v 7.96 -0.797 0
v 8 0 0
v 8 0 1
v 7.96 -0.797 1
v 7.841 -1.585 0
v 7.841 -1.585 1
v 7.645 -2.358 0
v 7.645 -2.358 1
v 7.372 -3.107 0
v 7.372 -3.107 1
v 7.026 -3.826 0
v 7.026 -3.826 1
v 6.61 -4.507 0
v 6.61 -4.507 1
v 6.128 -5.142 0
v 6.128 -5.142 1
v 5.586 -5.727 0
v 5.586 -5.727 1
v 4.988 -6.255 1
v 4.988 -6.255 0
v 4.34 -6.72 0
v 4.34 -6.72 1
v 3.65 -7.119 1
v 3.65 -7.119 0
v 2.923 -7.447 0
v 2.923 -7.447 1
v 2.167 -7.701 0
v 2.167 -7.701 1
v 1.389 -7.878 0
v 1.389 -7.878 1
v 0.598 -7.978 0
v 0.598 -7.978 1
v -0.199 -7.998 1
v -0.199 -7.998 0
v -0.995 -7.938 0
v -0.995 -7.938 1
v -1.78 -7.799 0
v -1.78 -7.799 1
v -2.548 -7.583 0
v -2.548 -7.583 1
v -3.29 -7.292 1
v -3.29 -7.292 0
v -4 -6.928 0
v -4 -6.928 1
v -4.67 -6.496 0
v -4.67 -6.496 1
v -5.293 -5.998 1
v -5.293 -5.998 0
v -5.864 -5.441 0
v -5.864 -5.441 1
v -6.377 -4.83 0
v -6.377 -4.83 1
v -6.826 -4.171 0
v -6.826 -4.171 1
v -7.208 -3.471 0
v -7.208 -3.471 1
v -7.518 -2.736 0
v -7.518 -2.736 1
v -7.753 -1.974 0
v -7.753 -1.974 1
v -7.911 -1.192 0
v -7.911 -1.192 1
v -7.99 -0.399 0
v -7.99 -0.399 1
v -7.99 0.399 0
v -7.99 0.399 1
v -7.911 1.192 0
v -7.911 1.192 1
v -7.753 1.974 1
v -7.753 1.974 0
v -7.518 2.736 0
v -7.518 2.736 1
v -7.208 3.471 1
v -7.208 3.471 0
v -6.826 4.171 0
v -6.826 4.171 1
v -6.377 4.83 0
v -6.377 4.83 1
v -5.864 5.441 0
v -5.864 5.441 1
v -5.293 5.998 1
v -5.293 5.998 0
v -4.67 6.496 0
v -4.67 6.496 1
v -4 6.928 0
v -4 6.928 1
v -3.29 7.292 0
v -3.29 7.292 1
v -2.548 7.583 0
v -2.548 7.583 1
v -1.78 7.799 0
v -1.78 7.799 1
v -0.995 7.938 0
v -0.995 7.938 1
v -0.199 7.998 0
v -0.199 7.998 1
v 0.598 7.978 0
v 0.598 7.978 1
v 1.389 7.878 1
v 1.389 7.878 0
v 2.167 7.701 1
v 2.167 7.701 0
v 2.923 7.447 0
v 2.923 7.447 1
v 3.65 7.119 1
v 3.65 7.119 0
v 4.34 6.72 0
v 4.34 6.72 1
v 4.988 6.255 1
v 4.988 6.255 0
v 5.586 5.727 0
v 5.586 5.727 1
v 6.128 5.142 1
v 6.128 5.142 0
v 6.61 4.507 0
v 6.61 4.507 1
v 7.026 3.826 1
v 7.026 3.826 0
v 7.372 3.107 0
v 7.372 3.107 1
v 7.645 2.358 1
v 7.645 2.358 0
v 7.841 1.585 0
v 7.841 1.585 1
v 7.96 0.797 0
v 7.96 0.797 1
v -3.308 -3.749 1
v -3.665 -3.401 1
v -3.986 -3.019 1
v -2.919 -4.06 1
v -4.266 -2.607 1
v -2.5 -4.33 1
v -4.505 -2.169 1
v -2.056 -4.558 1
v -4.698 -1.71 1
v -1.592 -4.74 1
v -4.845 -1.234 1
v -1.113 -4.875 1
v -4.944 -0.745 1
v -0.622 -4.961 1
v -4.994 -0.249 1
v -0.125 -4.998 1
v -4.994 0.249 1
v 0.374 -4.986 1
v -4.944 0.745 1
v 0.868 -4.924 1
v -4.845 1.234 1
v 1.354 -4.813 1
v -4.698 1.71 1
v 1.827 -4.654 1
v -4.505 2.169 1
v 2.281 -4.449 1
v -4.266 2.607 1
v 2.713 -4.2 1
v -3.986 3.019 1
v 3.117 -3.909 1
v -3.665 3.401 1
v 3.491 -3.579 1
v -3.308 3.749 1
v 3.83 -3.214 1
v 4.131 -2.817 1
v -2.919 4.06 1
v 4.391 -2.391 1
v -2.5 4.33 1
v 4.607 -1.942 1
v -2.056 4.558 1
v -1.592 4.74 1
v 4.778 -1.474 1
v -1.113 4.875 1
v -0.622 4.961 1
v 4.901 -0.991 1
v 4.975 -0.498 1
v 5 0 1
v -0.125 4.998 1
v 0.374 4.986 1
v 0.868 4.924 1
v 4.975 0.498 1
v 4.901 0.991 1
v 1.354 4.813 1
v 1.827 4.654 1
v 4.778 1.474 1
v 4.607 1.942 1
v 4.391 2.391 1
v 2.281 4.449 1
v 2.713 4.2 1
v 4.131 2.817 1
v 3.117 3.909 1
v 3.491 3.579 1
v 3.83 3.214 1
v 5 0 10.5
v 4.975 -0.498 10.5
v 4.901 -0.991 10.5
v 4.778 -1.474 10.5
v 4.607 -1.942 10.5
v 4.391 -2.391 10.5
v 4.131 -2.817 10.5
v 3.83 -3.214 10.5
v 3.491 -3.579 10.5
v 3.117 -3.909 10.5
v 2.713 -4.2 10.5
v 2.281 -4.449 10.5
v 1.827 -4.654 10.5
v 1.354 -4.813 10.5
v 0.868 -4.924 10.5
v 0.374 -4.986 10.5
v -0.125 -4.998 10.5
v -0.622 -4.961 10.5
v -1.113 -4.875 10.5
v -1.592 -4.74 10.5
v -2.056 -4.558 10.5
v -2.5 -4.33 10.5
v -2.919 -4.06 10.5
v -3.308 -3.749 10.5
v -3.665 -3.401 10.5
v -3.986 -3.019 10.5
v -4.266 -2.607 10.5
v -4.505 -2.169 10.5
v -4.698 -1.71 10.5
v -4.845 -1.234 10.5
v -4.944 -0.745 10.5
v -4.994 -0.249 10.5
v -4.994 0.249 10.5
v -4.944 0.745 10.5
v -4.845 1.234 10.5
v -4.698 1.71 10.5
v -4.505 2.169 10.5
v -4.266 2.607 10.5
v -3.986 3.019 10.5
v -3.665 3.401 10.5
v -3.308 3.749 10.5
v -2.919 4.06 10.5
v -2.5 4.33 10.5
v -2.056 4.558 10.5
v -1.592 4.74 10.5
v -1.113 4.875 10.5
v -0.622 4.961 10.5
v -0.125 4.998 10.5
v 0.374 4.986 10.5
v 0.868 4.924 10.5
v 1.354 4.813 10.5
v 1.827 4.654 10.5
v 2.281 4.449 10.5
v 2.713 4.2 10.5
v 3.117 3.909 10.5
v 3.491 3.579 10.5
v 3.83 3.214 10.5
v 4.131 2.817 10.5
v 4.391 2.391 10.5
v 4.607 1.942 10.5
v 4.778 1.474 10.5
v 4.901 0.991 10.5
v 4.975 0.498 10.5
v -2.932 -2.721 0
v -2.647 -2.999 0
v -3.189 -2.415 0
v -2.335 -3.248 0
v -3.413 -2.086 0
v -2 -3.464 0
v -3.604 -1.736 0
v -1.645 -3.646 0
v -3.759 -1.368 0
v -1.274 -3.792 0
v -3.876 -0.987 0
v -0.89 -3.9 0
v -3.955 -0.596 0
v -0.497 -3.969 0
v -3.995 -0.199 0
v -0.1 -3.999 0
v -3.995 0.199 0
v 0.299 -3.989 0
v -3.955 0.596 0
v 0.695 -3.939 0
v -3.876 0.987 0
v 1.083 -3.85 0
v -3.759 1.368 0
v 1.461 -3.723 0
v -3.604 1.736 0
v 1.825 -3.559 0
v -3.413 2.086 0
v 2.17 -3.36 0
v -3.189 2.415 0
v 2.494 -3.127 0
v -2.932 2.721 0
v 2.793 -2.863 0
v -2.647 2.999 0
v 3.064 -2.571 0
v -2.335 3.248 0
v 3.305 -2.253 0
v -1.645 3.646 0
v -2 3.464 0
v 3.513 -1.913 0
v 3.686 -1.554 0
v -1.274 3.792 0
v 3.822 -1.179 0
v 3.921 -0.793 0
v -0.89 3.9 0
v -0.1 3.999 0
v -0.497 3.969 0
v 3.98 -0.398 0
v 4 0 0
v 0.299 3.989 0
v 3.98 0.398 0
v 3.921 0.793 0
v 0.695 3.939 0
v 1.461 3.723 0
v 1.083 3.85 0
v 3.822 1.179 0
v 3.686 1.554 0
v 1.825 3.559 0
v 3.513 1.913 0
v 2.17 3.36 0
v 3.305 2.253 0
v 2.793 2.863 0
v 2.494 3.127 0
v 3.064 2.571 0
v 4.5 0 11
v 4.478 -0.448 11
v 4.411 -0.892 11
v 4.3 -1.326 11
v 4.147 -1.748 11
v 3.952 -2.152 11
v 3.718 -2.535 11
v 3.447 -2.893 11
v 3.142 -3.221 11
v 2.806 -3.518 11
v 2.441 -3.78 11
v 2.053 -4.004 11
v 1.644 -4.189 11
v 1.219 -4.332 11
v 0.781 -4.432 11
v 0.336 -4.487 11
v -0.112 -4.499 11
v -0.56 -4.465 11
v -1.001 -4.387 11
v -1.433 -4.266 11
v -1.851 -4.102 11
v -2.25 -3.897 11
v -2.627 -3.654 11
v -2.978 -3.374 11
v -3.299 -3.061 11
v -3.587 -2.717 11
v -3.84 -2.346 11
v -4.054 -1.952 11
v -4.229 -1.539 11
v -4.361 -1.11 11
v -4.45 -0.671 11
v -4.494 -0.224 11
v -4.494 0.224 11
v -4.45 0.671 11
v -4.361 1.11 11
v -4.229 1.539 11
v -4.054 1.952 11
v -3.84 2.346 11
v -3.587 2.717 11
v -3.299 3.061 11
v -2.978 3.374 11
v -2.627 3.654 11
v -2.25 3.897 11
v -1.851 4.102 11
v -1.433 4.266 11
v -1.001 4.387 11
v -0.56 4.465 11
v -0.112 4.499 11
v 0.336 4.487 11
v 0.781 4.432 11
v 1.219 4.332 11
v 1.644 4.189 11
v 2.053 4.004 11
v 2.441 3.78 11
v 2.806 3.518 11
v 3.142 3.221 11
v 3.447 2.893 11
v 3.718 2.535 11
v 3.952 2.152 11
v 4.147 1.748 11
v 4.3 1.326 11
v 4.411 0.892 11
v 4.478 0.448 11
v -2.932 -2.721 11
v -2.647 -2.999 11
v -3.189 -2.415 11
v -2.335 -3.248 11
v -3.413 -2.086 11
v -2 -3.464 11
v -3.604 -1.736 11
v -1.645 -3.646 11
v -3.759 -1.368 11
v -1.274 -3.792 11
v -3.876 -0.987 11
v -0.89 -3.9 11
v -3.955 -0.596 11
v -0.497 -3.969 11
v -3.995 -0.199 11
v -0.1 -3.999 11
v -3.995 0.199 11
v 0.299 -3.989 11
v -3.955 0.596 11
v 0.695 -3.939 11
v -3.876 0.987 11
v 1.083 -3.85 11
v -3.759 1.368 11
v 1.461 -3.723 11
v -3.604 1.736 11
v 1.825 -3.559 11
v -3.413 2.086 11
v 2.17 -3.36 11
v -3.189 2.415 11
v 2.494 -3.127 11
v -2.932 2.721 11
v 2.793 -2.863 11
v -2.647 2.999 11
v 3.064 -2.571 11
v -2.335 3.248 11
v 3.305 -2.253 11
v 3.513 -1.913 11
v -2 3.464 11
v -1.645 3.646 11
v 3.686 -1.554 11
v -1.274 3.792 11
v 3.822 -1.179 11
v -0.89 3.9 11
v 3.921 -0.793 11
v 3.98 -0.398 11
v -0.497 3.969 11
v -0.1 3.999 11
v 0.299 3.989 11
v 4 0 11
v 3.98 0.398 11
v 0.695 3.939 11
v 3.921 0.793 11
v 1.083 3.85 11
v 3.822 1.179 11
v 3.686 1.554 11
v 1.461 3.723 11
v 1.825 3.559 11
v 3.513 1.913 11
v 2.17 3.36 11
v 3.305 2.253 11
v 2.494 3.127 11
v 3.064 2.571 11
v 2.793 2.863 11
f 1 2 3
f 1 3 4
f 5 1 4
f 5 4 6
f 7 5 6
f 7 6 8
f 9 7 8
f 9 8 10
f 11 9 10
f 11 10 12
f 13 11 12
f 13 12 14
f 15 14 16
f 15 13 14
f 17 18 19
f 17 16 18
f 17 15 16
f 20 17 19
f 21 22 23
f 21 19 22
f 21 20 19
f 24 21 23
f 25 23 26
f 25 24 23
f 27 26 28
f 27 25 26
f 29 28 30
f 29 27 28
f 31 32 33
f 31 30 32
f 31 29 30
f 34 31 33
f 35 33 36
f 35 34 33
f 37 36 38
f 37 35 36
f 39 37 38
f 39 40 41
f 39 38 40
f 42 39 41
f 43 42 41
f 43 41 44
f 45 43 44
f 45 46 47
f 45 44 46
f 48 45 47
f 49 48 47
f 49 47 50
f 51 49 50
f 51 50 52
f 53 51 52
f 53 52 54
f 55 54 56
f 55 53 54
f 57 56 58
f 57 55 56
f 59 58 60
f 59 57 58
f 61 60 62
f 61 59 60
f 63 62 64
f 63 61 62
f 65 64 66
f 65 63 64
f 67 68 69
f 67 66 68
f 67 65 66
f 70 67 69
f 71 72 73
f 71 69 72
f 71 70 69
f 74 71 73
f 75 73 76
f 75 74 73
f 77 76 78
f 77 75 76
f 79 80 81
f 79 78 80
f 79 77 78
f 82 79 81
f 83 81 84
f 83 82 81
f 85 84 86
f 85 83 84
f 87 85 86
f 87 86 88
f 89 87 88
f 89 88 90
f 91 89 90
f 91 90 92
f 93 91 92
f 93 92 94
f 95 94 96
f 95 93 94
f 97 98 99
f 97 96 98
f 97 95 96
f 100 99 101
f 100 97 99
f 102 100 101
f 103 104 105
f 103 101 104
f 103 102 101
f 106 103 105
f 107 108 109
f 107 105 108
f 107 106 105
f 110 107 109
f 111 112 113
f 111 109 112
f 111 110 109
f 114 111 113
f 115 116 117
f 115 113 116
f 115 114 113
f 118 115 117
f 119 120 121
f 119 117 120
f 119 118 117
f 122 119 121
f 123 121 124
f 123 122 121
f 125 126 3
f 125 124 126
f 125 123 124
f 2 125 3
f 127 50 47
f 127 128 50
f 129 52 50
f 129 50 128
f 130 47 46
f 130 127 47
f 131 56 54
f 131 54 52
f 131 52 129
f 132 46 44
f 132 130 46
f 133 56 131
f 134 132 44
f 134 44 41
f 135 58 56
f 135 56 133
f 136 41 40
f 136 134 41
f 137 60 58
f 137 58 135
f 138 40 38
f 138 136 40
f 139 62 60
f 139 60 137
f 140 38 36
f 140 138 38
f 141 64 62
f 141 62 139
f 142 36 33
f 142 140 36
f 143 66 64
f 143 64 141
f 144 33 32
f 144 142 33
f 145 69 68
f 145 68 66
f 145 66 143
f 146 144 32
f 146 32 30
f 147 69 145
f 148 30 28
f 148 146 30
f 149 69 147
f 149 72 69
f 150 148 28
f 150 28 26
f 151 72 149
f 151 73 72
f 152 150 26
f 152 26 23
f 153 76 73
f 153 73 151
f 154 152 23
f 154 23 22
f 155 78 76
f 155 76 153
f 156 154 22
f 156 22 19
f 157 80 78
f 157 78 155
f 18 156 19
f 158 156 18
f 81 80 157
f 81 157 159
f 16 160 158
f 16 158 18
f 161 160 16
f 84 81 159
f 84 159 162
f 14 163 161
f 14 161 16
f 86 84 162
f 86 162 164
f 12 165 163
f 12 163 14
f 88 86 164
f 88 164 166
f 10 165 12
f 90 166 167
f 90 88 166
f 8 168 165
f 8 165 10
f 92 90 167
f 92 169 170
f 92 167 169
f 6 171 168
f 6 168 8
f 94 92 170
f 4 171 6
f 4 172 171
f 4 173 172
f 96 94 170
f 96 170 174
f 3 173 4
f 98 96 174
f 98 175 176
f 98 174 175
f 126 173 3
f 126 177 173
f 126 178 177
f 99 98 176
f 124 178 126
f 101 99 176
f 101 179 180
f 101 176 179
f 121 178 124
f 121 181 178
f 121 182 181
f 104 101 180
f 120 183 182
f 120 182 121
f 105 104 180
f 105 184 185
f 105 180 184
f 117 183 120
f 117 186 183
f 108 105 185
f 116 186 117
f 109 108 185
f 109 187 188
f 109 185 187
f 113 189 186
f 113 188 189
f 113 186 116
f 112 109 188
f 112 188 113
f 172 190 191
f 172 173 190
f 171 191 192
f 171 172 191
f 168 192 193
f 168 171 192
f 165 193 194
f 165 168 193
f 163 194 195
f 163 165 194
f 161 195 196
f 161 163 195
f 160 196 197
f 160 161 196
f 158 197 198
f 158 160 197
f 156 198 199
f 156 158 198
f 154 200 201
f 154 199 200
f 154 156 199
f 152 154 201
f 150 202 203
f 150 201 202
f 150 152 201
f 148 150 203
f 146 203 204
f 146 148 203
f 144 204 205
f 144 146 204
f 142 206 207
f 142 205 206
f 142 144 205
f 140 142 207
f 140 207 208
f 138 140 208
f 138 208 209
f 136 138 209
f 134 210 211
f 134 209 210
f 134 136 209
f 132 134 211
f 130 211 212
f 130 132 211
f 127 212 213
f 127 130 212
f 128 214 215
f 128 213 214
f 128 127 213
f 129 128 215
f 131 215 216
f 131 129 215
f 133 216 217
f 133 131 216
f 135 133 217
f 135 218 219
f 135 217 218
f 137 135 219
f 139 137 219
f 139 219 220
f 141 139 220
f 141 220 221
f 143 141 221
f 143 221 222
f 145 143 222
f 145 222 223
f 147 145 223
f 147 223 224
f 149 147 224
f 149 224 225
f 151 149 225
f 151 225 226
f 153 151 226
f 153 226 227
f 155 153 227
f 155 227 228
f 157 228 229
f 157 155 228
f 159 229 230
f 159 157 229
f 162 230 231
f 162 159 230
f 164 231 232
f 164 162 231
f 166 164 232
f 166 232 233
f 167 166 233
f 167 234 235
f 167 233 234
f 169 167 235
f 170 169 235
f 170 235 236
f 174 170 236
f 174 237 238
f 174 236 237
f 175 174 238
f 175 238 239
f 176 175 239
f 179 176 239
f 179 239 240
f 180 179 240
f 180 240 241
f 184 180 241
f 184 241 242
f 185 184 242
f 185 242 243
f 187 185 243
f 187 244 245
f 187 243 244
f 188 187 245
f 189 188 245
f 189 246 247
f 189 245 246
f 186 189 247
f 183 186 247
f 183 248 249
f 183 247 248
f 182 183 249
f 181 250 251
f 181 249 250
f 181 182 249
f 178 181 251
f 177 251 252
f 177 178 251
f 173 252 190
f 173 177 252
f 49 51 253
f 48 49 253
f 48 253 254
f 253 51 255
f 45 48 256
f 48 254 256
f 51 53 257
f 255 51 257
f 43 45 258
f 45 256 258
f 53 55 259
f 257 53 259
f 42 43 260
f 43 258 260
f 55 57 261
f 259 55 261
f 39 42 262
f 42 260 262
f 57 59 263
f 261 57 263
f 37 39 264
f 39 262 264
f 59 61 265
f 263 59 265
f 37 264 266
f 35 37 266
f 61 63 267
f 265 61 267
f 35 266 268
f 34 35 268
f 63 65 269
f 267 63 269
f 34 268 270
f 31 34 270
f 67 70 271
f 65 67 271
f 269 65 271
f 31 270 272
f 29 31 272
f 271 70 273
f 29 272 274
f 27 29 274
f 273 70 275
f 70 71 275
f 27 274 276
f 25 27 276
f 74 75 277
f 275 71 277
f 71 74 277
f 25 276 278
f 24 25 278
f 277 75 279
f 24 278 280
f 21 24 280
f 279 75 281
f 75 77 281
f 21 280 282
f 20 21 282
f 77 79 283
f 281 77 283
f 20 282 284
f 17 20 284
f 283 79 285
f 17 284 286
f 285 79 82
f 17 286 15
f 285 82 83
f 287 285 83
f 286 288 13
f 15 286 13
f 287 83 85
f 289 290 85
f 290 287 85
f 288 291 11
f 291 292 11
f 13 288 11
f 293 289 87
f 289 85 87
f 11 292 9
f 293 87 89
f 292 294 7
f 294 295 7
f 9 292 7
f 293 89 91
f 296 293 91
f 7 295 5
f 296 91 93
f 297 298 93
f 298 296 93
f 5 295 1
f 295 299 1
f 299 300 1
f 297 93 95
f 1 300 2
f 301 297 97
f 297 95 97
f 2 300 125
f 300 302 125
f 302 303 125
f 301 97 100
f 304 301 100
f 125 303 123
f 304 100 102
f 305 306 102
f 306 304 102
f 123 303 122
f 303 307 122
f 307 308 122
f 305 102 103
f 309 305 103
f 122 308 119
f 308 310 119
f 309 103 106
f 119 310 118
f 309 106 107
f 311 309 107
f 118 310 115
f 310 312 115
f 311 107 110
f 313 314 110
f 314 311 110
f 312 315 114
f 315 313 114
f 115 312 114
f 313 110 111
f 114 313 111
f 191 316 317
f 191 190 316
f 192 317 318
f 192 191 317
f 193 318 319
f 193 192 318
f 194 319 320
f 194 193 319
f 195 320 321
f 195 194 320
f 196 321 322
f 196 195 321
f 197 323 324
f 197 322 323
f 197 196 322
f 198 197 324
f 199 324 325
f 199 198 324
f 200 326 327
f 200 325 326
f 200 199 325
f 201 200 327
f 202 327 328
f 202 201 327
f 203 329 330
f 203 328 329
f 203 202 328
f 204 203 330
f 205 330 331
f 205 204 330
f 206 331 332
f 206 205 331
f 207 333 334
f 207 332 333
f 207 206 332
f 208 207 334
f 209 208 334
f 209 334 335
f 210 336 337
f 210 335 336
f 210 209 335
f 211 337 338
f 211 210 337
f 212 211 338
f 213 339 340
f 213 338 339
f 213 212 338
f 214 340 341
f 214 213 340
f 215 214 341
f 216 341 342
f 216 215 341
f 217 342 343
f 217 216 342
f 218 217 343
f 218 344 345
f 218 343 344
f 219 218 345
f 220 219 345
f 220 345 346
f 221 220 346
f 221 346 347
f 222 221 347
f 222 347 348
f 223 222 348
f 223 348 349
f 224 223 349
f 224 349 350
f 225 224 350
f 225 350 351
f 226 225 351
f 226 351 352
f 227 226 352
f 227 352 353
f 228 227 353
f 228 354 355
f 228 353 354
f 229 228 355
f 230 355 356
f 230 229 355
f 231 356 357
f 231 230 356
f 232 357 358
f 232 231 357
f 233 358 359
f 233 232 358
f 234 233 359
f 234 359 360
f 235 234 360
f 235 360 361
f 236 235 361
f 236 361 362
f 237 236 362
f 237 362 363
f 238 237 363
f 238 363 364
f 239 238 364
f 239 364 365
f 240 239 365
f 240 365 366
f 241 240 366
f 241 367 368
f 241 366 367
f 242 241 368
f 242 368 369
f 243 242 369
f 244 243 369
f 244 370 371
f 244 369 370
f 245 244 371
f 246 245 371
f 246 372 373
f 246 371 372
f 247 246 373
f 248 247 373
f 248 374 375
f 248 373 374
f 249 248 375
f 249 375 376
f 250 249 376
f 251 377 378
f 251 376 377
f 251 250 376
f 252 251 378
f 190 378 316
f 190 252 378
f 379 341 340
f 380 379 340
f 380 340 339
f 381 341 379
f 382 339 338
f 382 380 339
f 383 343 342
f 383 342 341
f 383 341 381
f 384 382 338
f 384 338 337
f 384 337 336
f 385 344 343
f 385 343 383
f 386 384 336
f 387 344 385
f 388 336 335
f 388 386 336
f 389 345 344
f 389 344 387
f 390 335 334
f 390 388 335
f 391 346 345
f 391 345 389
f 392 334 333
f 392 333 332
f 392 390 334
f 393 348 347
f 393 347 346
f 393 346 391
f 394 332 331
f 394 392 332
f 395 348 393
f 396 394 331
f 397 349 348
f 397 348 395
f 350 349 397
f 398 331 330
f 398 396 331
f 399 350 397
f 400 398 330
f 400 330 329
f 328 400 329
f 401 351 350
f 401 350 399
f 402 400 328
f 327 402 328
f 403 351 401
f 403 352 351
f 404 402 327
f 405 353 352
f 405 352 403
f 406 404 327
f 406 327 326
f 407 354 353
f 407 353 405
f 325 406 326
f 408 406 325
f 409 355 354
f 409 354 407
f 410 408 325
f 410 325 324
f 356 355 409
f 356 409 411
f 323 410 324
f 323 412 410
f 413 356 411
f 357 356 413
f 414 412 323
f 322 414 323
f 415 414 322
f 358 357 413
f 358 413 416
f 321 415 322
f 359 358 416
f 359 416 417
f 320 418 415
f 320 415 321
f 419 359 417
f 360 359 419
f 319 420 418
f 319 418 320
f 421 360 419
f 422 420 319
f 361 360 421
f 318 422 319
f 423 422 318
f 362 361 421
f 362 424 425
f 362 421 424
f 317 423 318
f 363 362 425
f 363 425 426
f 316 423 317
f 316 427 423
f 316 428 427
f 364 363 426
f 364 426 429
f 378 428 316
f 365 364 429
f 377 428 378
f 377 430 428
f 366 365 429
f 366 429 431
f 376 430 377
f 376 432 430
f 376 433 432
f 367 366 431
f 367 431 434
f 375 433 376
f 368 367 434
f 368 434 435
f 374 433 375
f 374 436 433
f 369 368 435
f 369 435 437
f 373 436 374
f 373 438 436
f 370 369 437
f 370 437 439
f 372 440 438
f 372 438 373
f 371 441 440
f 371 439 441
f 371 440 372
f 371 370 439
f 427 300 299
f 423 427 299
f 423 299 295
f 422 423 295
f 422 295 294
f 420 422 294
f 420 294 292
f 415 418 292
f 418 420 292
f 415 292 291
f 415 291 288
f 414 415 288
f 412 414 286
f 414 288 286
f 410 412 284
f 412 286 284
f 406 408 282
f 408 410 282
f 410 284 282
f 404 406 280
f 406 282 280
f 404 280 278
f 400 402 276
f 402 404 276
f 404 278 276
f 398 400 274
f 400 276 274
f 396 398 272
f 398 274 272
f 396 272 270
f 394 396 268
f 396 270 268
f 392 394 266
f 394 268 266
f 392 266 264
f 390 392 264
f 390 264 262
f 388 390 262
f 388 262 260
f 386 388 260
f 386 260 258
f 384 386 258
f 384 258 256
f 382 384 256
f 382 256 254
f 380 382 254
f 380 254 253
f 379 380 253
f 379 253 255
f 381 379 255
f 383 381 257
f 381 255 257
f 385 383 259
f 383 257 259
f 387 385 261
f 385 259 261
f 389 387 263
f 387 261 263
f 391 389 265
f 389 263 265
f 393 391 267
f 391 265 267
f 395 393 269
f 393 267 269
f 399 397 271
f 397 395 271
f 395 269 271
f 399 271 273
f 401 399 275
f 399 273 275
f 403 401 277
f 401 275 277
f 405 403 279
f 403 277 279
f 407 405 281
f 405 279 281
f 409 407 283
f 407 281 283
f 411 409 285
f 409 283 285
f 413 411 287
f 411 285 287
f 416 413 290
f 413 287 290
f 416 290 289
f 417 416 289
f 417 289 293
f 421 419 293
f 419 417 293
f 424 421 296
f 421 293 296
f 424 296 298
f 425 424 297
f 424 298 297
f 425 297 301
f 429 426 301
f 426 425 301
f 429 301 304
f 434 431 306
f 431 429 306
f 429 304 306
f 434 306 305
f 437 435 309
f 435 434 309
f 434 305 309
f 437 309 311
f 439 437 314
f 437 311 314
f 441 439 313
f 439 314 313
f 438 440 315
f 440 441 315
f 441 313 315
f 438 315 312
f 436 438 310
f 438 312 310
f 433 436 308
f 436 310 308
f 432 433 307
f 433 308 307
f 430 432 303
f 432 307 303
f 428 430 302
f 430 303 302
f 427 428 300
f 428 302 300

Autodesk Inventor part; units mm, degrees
ref_plane "YZ Plane" through (0, 0, 0) normal (1, 0, 0) x (0, 1, 0)
ref_plane "XZ Plane" through (0, 0, 0) normal (0, 1, 0) x (-1, 0, 0)
ref_plane "XY Plane" through (0, 0, 0) normal (0, 0, 1) x (1, 0, 0)
sketch "スケッチ1" plane through (0, 0, 0) normal (0, 0, 1) x (1, 0, 0)
  circle A0 centre (0, 0) radius 4
  circle A1 centre (0, 0) radius 8
  dimension "d0" = 8
  dimension "d1" = 16
extrude "押し出し1" add sketch "スケッチ1" along normal blind 1
sketch "スケッチ2" plane through (0, 0, 1) normal (0, 0, 1) x (1, 0, 0)
  circle A0 centre (0, 0) radius 5
  circle A1 centre (0, 0) radius 8 projected
  circle A2 centre (0, 0) radius 4 projected
  dimension "d4" = 10
extrude "押し出し2" add sketch "スケッチ2" along normal blind 10 contours A0
chamfer "面取り1" distance 0.5 angle 45 1 edges at (-5, 0, 11)
properties part number "オイレスw10f8-10a" material "アセタール樹脂、黒"
